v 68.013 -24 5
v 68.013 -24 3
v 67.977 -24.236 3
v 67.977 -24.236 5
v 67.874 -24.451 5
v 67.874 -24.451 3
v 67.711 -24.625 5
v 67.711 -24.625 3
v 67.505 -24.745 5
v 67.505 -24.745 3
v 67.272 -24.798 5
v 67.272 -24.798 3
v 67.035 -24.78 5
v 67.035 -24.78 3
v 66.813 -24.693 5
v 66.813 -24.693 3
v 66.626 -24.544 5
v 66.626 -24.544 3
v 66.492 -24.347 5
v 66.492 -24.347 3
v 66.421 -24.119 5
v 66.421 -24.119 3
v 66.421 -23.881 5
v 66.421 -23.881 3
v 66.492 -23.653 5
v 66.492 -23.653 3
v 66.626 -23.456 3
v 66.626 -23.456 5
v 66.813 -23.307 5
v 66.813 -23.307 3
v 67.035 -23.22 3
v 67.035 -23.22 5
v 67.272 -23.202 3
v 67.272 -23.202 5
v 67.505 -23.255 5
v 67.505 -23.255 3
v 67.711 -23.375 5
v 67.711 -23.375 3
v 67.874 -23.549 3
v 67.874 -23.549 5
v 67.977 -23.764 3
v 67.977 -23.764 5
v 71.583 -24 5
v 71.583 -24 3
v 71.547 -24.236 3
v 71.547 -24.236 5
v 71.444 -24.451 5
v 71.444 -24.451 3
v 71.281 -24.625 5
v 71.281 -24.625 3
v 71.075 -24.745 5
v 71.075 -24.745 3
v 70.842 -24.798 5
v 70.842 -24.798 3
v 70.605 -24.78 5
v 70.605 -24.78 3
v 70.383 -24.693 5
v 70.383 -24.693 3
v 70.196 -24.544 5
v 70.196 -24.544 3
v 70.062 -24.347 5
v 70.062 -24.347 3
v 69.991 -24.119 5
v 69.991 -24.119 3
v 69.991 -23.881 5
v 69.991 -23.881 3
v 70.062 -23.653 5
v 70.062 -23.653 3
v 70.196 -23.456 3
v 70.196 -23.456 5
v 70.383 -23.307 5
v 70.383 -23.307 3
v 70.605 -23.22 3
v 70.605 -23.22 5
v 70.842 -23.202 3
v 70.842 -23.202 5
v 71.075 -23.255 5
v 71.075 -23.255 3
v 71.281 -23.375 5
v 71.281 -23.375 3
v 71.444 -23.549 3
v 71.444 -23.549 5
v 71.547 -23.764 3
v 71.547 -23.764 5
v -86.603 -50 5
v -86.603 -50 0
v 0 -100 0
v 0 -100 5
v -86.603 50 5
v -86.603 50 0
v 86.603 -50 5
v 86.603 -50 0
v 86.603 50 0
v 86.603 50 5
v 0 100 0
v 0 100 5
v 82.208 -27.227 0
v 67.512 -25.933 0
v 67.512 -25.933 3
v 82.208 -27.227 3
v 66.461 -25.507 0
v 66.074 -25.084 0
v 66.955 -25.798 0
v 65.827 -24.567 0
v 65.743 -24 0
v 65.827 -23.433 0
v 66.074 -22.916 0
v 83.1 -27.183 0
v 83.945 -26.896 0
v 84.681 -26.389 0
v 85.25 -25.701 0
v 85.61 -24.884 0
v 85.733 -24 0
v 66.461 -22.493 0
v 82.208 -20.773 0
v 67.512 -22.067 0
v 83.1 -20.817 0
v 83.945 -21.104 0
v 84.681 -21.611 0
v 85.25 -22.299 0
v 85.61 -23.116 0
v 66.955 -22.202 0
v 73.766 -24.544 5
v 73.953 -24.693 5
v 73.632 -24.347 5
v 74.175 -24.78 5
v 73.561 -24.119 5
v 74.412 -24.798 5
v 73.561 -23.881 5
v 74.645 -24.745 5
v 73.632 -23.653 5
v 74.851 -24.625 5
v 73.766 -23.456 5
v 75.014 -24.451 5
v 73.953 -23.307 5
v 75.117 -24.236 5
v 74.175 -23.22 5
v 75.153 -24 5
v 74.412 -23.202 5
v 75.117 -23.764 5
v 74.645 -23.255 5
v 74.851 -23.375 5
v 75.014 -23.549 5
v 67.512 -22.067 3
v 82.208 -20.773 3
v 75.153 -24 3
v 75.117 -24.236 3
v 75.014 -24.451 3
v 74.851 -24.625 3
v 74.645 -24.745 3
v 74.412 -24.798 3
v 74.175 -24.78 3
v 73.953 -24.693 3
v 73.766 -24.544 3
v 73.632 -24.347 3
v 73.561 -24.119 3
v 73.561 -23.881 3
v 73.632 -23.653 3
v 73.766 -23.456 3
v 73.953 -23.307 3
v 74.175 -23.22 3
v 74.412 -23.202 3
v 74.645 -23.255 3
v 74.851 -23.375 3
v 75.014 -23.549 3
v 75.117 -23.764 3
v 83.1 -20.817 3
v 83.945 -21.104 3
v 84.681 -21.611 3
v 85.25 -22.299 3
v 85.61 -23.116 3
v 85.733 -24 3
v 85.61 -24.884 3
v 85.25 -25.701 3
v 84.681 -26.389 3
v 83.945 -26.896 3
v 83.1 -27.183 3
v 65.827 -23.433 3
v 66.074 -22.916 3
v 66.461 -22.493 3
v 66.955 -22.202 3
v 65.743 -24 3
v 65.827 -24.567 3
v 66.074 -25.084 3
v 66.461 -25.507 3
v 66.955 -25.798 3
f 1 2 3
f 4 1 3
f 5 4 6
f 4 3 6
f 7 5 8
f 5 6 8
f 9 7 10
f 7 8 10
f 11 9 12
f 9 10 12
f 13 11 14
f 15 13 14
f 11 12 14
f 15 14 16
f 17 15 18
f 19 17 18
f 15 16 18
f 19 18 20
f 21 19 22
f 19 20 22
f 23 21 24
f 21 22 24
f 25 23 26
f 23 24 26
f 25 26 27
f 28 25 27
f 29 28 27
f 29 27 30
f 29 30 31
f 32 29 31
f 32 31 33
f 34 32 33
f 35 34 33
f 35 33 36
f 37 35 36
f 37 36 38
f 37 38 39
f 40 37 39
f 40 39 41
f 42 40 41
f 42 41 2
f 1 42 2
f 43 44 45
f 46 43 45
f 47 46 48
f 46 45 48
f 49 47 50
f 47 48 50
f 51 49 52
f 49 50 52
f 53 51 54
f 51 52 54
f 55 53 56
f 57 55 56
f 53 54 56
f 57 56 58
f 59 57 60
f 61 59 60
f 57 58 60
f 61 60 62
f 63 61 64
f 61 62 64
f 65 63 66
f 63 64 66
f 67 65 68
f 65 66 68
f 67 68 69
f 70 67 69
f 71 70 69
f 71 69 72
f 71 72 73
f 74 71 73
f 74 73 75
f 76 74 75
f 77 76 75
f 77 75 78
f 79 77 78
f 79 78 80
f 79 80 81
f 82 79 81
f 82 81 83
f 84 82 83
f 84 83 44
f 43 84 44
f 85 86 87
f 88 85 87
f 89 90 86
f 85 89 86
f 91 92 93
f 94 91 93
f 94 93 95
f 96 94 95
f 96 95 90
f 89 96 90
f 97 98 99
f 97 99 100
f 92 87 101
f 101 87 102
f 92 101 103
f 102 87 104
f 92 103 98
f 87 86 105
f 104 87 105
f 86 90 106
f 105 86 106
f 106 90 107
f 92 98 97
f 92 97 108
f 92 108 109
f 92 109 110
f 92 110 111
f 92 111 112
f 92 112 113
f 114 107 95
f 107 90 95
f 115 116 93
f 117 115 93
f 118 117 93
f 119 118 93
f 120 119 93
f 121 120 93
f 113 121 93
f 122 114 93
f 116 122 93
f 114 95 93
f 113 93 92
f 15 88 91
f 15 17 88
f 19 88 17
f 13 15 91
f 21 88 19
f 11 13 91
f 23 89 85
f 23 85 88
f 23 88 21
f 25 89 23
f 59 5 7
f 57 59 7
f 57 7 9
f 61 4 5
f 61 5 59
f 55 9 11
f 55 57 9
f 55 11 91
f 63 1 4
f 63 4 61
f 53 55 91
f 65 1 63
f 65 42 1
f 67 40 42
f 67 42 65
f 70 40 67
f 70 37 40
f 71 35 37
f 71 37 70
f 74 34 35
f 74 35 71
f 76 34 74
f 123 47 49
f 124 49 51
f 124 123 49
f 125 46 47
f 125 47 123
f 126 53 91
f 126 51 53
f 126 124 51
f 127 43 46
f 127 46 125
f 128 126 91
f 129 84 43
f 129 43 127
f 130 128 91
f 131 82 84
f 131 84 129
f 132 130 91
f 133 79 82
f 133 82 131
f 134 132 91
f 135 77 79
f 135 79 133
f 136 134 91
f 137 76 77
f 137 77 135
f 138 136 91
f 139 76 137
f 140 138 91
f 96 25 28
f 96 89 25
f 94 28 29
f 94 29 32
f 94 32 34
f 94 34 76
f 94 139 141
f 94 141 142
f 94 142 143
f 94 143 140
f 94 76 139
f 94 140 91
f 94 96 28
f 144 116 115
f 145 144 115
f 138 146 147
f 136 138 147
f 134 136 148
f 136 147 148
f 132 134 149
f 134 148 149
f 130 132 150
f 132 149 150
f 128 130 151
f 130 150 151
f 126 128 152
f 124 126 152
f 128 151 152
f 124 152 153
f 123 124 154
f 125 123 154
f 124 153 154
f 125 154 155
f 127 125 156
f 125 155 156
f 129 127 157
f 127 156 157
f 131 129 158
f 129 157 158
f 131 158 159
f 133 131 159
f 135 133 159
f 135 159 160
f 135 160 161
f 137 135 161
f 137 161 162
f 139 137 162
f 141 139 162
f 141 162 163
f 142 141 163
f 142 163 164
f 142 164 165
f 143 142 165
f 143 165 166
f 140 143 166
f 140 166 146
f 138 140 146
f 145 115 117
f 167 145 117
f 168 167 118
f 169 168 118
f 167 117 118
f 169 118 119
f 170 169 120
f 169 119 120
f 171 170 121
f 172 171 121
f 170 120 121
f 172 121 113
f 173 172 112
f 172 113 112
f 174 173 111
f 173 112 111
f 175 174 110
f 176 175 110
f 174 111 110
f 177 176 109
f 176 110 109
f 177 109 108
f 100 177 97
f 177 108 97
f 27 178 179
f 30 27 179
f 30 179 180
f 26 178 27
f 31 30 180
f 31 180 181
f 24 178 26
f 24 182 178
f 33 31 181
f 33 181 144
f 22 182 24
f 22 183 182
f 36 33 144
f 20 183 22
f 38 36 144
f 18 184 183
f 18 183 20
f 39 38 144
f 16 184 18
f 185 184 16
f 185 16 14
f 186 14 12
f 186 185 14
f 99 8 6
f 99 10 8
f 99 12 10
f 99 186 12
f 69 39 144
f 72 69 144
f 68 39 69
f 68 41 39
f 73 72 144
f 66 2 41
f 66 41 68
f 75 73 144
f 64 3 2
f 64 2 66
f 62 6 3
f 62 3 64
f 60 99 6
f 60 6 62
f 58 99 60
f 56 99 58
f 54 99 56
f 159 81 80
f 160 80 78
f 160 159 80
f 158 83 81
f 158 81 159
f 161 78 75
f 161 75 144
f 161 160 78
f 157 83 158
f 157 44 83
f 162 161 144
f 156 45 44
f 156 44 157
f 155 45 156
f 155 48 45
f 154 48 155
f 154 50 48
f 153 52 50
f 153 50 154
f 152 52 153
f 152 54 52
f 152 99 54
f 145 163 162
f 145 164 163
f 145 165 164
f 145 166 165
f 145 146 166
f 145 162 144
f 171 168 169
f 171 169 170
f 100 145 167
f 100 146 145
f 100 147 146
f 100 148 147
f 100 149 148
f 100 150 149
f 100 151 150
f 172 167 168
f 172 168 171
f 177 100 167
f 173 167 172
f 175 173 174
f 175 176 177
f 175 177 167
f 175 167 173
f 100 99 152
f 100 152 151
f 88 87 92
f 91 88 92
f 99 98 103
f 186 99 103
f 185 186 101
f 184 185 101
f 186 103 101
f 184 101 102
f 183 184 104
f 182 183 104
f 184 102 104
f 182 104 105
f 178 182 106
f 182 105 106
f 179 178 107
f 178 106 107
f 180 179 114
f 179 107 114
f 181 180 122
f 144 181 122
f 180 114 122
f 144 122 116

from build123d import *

# Parameters (mm, degrees)
PAD_DEPTH    = 5
POCKET_DEPTH = 3
SKETCH004_R  = 0.8
HOLE_DEPTH   = 25


with BuildPart() as part:
    # Sketch → Pad (new body)
    with BuildSketch(Plane.XY):
        Polygon((86.60254, -50), (86.60254, 50), (0, 100), (-86.60254, 50), (-86.60254, -50), (0, -100), align=None)
    extrude(amount=PAD_DEPTH)

    # Sketch003 (on Face7 of Pad) → Pocket (cut)
    with BuildSketch(Plane(origin=(0, 0, 0), x_dir=(1, 0, 0), z_dir=(0, 0, -1))):
        with BuildLine():
            ThreePointArc((82.208138, 20.772506), (85.73254, 24), (82.208138, 27.227494))
            Line((67.51225, 25.932512), (82.208138, 27.227494))
            ThreePointArc((67.51225, 25.932512), (65.74254, 24), (67.51225, 22.067488))
            Line((67.51225, 22.067488), (82.208138, 20.772506))
        make_face()
    extrude(amount=-POCKET_DEPTH, mode=Mode.SUBTRACT)

    # Sketch004 (on Face13 of Pocket) → Hole (cut)
    with BuildSketch(Plane(origin=(0, 0, 3), x_dir=(1, 0, 0), z_dir=(0, 0, -1))):
        with Locations((67.21254, 24)):
            Circle(SKETCH004_R)
        with Locations((70.78254, 24)):
            Circle(SKETCH004_R)
        with Locations((74.35254, 24)):
            Circle(SKETCH004_R)
    extrude(amount=-HOLE_DEPTH, mode=Mode.SUBTRACT)


solid = part.part
